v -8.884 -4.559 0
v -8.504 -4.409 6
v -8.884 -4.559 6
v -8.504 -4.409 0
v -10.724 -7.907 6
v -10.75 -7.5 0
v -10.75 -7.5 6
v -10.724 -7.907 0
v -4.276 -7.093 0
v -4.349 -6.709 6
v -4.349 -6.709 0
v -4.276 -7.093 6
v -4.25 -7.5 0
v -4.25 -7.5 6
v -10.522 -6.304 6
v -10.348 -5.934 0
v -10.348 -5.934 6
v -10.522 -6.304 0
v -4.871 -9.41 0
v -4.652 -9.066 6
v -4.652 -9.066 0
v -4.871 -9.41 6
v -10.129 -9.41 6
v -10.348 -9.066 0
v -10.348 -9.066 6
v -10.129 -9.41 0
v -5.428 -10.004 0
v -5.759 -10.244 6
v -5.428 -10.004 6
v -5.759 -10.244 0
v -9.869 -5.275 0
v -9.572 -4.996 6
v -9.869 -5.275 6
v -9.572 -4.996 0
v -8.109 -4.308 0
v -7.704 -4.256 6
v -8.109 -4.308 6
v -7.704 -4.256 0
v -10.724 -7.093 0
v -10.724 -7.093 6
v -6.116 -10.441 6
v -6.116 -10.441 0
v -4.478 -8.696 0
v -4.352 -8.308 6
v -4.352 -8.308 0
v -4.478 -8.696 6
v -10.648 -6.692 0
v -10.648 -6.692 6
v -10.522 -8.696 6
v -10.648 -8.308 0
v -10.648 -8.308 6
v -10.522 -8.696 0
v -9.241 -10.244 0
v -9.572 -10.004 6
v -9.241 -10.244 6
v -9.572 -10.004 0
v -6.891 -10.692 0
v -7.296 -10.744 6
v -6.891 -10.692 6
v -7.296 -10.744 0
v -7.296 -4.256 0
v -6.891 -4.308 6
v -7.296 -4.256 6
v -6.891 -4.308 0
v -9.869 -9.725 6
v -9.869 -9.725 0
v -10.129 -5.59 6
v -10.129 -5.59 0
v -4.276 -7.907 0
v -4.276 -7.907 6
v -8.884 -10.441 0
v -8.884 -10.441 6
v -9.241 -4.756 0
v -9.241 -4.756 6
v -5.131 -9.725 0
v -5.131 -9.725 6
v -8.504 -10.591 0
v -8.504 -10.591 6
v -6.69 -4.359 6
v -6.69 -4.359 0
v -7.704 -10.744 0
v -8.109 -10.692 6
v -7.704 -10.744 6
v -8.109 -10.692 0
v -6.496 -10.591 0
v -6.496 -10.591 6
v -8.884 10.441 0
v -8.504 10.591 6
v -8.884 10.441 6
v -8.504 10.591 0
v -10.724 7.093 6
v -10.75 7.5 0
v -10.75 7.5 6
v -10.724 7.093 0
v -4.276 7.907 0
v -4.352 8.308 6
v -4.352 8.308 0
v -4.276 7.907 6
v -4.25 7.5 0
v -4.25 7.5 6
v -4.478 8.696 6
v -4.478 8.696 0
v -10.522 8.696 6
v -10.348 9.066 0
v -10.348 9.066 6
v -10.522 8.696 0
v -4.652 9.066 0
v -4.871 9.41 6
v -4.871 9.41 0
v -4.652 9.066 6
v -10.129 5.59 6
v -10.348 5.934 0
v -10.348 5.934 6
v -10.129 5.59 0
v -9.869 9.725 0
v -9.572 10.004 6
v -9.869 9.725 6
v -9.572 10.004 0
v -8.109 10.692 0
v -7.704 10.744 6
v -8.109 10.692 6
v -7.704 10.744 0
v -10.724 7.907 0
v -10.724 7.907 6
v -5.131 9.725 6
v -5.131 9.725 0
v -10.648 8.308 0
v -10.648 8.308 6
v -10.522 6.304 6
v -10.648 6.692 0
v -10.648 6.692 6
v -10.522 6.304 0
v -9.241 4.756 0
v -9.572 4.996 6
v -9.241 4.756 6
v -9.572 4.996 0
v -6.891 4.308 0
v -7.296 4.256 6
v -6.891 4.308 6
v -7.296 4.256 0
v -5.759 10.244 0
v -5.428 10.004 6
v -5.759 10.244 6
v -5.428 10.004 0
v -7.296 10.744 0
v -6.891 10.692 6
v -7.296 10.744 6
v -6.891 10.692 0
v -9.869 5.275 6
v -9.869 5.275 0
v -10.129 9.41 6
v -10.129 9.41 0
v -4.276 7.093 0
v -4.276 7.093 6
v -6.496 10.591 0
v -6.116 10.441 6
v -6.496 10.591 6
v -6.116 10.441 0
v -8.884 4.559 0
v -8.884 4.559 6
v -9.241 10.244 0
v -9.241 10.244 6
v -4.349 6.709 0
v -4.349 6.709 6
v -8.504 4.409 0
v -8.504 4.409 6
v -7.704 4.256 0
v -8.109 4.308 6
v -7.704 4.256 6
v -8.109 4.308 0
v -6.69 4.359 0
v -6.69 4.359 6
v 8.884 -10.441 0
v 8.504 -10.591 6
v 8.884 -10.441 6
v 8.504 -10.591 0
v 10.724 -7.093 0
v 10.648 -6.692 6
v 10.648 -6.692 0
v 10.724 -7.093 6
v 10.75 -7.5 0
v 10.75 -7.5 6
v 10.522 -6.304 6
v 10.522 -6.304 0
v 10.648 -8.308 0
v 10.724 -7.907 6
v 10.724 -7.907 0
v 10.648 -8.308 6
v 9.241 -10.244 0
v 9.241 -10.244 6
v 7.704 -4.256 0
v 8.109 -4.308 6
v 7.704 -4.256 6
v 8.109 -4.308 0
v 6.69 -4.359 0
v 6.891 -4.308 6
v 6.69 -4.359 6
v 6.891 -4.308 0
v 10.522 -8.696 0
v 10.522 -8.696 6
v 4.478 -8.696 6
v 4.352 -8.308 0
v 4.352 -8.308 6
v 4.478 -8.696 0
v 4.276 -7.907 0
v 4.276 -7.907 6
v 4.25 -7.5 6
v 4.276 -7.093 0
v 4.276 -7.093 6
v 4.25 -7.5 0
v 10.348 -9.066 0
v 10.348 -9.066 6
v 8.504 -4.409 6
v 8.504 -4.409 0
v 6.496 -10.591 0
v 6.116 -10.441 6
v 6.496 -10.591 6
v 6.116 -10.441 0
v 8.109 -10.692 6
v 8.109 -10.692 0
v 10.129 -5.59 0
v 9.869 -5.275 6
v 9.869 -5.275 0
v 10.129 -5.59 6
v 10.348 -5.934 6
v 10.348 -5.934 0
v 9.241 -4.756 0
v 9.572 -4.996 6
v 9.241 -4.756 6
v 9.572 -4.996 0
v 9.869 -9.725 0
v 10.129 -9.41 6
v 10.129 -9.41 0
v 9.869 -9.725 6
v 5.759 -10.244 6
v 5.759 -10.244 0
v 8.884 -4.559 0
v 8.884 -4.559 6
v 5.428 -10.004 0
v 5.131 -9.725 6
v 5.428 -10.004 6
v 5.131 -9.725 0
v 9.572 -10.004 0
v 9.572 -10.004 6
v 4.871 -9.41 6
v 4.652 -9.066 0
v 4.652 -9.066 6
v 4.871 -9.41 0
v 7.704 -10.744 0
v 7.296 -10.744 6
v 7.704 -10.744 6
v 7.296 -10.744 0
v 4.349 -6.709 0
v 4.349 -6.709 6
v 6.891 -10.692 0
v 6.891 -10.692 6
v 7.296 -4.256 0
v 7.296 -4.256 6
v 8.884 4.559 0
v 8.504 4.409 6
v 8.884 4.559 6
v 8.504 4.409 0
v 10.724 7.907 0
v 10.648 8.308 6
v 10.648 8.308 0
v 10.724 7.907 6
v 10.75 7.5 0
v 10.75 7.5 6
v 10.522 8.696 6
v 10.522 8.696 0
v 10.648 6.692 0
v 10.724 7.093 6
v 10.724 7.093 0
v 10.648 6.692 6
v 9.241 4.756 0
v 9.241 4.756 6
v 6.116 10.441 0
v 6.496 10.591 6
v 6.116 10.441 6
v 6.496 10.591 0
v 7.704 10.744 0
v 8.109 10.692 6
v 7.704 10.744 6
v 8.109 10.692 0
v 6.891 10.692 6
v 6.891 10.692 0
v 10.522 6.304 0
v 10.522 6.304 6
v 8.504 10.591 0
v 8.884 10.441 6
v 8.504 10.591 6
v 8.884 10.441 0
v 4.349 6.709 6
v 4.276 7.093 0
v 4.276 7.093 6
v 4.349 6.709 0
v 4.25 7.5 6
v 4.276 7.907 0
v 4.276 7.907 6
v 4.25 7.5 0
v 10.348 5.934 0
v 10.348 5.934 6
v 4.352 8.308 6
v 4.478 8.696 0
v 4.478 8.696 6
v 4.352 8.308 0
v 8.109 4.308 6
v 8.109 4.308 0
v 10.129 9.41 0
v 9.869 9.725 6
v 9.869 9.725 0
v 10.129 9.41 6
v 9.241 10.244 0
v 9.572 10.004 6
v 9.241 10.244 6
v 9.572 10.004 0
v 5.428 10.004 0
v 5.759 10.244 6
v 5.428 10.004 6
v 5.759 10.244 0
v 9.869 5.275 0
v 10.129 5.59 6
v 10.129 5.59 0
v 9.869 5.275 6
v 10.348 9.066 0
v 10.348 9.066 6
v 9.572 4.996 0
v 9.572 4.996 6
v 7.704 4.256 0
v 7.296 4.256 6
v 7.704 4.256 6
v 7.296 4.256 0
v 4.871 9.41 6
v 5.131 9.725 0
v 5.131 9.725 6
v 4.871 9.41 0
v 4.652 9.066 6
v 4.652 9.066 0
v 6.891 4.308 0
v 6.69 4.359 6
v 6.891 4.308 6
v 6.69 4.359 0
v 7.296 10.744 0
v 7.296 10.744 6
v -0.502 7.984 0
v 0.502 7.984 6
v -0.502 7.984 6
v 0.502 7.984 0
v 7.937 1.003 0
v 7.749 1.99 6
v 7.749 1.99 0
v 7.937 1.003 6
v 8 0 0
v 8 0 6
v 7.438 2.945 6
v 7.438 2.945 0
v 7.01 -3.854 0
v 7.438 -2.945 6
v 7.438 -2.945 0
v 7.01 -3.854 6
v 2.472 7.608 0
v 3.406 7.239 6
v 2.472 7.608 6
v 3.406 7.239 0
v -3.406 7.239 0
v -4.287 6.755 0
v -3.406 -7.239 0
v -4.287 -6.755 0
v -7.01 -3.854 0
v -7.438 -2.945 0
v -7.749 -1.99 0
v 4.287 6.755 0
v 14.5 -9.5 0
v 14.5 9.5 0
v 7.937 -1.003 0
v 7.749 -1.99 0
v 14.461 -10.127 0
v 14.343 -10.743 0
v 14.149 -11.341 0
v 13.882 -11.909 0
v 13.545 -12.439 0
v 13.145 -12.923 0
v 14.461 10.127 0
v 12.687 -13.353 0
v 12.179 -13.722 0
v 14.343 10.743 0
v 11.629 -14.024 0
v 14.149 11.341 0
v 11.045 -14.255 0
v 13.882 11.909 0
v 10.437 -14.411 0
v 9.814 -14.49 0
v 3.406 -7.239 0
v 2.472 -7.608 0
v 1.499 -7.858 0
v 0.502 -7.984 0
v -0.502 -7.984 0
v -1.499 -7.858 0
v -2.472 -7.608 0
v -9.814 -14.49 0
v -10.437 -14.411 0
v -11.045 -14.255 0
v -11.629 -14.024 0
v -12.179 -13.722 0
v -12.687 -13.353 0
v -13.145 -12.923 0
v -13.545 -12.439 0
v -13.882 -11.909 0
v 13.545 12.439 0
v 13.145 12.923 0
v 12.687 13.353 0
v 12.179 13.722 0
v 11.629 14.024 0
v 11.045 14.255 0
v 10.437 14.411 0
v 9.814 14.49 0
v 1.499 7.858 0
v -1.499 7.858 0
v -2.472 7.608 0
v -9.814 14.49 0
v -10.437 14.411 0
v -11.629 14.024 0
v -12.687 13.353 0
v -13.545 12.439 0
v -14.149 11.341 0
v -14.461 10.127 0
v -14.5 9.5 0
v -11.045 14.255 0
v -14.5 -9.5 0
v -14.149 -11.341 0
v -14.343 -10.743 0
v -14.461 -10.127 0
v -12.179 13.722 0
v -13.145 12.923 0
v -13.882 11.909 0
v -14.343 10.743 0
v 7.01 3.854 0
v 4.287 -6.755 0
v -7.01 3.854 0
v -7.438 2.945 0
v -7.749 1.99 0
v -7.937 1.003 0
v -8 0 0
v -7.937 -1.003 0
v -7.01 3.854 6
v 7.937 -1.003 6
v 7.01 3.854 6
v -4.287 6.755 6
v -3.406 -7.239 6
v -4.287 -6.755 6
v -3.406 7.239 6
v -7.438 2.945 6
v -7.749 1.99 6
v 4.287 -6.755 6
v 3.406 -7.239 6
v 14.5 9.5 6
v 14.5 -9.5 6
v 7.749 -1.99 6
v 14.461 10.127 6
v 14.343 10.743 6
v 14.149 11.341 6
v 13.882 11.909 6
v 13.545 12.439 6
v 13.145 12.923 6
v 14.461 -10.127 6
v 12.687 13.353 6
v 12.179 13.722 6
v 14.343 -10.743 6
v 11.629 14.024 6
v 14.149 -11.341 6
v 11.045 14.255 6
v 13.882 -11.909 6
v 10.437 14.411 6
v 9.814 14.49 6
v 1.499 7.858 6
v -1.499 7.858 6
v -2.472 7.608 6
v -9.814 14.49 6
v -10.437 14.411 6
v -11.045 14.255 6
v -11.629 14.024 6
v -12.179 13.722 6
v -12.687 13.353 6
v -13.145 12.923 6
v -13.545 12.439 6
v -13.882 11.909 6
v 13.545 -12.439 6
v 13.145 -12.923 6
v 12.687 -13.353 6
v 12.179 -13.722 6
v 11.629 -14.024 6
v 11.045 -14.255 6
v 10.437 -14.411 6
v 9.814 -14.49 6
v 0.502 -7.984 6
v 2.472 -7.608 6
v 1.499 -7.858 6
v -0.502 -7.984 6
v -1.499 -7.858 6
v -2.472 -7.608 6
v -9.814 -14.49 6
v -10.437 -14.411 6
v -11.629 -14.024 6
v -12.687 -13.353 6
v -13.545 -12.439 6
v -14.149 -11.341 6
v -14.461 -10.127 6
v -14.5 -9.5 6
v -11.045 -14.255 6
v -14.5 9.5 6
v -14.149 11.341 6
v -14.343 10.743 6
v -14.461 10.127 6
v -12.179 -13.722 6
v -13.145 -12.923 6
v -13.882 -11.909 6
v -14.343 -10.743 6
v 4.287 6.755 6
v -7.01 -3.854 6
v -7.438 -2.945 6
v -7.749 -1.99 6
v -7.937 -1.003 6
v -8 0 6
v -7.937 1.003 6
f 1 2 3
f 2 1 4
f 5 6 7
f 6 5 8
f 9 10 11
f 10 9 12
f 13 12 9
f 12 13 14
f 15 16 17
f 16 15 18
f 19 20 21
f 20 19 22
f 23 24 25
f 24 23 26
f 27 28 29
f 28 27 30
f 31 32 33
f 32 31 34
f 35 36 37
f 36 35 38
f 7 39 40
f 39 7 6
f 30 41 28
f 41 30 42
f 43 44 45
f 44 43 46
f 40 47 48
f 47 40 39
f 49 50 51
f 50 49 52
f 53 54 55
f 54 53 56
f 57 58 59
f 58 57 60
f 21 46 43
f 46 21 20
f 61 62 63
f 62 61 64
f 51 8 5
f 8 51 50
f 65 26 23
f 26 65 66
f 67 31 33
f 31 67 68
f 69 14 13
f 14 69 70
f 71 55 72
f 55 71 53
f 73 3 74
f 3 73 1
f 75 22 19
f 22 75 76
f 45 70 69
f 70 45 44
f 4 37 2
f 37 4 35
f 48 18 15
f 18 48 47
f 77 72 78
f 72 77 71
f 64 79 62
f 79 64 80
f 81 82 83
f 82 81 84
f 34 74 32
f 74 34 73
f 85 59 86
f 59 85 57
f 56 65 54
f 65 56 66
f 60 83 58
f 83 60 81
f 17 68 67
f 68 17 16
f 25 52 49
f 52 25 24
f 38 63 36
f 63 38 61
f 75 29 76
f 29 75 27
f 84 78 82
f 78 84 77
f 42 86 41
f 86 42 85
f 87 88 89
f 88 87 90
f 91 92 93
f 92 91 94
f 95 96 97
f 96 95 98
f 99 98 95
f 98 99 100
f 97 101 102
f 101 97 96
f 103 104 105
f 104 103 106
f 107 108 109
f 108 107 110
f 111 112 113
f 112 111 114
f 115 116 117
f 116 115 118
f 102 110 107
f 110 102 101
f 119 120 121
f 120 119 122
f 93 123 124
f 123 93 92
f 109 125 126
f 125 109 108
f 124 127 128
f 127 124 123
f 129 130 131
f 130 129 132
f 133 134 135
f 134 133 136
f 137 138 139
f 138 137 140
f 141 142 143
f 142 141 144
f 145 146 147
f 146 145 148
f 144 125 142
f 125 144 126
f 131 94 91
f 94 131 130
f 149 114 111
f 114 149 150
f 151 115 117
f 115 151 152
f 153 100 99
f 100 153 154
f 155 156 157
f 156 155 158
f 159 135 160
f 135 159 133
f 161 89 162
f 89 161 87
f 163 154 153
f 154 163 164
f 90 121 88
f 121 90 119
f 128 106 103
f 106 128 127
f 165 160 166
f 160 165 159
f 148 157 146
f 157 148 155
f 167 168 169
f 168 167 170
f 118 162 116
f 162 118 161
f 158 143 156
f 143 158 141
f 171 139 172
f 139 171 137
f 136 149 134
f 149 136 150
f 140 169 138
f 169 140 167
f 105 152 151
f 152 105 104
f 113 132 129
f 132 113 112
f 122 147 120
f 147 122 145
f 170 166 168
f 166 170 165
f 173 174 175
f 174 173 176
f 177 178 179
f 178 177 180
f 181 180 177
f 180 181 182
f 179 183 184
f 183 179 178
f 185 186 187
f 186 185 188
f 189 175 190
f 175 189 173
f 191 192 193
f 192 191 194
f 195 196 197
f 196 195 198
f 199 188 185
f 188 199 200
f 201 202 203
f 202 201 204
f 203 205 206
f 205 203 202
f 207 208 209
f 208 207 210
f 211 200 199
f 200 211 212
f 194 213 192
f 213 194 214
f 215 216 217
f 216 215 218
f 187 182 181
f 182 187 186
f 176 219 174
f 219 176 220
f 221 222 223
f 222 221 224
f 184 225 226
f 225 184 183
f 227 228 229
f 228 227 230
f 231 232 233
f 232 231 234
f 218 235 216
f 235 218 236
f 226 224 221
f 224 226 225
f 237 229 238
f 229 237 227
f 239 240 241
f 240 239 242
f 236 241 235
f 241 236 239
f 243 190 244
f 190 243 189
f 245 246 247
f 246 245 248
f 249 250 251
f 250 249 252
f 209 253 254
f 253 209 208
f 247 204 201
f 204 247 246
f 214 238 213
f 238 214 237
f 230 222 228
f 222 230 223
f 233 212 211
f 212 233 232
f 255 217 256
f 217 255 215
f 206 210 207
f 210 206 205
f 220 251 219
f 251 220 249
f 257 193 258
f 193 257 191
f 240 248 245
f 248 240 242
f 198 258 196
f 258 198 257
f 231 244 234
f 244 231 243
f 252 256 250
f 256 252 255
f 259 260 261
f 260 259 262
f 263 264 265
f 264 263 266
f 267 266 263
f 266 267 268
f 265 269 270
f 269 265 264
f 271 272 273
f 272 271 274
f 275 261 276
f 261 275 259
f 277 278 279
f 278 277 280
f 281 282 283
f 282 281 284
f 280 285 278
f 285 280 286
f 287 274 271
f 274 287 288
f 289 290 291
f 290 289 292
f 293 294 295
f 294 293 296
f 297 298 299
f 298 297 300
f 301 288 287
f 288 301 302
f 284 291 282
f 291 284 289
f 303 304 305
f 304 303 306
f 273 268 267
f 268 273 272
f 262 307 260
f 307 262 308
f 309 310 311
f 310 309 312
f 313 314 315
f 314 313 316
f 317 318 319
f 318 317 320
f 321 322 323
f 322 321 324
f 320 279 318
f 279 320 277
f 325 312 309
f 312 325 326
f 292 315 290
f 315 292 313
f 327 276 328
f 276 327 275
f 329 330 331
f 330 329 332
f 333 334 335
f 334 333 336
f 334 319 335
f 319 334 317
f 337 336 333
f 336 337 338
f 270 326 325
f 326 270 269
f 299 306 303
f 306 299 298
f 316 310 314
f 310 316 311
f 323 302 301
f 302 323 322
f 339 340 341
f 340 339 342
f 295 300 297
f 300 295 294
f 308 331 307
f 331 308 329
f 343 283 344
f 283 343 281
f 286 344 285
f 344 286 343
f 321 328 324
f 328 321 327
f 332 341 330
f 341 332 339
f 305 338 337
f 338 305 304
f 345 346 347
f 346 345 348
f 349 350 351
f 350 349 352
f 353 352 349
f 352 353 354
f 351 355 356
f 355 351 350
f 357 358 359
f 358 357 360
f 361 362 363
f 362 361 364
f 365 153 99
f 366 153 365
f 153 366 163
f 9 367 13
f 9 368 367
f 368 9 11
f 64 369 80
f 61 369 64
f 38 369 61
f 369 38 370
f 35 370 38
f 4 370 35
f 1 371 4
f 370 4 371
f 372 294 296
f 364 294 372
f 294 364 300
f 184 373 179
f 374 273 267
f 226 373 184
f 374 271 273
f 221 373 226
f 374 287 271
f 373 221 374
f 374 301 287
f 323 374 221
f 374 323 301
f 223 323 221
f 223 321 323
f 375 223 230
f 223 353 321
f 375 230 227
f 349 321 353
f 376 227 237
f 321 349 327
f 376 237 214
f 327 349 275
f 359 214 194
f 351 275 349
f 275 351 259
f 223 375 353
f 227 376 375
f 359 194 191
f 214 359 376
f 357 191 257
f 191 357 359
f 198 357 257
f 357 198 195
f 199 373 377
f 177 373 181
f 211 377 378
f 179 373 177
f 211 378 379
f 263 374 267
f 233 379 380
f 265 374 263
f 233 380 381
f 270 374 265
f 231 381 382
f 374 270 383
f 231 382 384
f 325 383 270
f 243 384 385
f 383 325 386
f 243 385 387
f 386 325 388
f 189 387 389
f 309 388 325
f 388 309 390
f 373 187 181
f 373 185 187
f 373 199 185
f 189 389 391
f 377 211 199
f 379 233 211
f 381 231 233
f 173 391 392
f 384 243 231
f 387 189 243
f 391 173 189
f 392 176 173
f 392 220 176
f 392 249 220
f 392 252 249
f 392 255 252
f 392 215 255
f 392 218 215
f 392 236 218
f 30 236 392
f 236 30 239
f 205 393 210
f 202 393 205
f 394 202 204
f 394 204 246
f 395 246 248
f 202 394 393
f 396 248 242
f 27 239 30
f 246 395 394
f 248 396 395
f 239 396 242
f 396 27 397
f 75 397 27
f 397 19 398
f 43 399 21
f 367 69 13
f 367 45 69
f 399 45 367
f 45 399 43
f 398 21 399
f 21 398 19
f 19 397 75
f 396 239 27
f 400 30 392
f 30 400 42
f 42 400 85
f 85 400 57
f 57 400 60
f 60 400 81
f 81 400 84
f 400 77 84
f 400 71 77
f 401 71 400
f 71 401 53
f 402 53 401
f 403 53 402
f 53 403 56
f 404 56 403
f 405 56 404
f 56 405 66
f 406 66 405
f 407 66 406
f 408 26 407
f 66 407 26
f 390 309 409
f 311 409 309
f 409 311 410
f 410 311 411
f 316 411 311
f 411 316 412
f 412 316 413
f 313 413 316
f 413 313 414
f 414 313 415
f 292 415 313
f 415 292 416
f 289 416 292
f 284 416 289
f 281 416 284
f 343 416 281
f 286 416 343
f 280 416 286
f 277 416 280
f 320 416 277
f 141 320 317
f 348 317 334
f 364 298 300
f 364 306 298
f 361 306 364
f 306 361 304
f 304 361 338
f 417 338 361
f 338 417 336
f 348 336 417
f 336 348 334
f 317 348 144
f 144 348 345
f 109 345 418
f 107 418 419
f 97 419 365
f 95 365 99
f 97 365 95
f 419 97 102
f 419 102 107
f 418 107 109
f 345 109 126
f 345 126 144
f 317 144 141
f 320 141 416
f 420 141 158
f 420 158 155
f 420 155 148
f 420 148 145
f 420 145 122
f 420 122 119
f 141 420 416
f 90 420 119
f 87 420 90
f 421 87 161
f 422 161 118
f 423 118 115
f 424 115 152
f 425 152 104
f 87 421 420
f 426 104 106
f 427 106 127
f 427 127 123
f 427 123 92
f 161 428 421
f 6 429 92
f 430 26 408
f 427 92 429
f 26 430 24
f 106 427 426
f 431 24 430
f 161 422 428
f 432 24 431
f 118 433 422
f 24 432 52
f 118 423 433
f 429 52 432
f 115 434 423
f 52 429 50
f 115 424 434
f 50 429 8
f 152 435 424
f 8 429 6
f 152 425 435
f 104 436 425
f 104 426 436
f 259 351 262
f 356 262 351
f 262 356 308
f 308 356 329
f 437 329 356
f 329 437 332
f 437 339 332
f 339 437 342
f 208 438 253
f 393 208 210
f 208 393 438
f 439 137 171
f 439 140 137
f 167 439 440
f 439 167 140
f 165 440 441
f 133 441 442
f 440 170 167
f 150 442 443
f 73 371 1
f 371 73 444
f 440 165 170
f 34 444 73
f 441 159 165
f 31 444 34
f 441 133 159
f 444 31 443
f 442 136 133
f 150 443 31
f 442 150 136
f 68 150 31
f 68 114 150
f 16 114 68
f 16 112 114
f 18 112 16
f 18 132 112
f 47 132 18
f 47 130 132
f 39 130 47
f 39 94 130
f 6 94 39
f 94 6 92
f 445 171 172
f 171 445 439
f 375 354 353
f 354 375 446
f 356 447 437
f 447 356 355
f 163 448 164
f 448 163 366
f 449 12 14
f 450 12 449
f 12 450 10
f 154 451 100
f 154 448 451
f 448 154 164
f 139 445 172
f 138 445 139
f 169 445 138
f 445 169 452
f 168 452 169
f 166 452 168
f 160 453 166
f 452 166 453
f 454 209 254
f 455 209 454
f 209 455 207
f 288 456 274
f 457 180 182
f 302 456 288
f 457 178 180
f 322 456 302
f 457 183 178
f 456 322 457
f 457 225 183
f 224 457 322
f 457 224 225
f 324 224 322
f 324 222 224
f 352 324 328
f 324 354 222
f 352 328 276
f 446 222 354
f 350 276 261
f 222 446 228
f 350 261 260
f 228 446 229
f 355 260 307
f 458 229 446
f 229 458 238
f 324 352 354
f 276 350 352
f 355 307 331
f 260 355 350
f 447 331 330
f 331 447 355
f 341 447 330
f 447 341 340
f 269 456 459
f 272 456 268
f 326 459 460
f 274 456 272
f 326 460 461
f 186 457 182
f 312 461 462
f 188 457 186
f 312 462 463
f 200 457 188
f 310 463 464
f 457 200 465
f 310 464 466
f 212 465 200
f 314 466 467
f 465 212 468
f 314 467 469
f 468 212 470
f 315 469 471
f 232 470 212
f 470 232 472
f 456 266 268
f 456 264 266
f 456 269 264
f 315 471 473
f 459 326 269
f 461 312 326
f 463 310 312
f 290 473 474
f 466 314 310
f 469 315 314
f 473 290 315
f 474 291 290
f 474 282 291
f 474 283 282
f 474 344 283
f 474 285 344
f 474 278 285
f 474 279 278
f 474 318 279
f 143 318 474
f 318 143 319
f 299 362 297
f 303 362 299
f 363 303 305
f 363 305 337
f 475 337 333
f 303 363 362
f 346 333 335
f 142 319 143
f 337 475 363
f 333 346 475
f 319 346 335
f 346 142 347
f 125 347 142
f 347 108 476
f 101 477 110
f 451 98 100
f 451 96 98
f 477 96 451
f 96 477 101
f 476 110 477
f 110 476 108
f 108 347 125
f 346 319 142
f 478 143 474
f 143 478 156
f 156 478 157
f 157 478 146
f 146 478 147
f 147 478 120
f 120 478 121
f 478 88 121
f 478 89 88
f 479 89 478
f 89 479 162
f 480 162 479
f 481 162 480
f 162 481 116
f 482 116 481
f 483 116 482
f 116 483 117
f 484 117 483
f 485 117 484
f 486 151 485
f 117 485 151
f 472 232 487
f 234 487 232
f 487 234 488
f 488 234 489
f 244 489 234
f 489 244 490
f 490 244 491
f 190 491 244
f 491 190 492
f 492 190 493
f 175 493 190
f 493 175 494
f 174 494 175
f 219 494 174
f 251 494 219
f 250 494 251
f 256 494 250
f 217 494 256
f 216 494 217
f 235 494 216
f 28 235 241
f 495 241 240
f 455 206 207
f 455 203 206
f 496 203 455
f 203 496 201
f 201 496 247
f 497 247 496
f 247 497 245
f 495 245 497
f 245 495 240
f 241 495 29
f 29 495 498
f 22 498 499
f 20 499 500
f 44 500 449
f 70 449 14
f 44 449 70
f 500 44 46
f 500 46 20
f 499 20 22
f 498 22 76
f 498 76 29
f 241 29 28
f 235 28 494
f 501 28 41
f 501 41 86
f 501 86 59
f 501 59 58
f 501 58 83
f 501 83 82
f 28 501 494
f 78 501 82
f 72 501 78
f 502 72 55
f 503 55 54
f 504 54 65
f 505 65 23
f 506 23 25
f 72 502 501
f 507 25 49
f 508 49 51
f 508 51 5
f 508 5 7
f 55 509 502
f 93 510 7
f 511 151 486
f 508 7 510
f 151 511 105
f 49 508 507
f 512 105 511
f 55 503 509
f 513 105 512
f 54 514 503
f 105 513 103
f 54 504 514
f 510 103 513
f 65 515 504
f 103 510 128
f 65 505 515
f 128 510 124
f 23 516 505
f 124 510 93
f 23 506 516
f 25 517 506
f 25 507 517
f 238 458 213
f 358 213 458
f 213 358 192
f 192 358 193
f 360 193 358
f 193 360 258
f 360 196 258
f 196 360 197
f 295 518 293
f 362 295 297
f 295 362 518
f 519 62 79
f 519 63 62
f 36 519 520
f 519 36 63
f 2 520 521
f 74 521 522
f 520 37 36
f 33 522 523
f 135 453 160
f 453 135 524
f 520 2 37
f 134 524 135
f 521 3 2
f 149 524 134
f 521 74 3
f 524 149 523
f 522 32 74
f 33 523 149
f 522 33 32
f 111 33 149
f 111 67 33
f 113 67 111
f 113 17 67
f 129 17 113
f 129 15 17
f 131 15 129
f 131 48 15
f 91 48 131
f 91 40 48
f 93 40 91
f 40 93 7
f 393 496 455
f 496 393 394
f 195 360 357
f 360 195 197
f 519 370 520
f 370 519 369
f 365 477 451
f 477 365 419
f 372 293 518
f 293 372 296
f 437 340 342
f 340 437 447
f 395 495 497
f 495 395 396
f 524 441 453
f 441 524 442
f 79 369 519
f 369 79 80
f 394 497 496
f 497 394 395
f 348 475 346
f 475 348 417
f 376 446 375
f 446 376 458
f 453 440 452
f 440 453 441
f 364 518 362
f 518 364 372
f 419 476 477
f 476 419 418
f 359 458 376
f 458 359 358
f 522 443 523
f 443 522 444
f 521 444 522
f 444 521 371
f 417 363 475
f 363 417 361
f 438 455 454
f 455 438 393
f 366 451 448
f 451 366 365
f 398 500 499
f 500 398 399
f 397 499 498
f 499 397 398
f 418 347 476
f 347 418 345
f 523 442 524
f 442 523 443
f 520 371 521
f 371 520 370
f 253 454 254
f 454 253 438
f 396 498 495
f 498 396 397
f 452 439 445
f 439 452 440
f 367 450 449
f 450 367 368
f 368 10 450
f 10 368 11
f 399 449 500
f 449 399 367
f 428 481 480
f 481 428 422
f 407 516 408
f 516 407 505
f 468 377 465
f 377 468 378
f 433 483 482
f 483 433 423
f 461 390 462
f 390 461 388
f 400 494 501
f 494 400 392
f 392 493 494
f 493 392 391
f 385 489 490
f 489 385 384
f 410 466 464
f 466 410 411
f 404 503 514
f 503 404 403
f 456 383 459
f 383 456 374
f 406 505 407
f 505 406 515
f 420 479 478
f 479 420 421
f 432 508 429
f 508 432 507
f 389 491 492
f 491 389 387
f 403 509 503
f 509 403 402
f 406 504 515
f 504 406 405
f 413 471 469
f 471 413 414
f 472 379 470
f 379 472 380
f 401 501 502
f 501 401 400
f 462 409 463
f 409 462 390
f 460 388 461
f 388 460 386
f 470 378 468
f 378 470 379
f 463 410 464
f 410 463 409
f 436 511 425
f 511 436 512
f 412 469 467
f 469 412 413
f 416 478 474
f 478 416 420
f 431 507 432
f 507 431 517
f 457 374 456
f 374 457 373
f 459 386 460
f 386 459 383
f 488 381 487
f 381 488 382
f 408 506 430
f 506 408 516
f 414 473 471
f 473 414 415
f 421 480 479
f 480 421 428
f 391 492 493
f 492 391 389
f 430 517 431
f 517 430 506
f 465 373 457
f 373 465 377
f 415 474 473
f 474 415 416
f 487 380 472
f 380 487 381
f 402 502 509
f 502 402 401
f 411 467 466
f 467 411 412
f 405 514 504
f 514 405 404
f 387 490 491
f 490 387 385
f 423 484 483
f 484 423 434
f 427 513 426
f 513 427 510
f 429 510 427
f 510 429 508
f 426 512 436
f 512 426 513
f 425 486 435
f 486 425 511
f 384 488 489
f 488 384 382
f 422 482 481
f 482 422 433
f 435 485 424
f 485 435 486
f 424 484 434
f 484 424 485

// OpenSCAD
$fn = 50;

difference() {
	union() {
		hull() {
			translate(v = [-9.5, 9.5, 0]) {
				cylinder(h = 6, r = 5);
			}
			translate(v = [9.5, 9.5, 0]) {
				cylinder(h = 6, r = 5);
			}
			translate(v = [-9.5, -9.5, 0]) {
				cylinder(h = 6, r = 5);
			}
			translate(v = [9.5, -9.5, 0]) {
				cylinder(h = 6, r = 5);
			}
		}
	}
	union() {
		translate(v = [-7.5, -7.5, -100.0]) {
			cylinder(h = 200, r = 3.25);
		}
		translate(v = [-7.5, 7.5, -100.0]) {
			cylinder(h = 200, r = 3.25);
		}
		translate(v = [7.5, -7.5, -100.0]) {
			cylinder(h = 200, r = 3.25);
		}
		translate(v = [7.5, 7.5, -100.0]) {
			cylinder(h = 200, r = 3.25);
		}
		translate(v = [-7.5, -7.5, -100.0]) {
			cylinder(h = 200, r = 1.8);
		}
		translate(v = [-7.5, 7.5, -100.0]) {
			cylinder(h = 200, r = 1.8);
		}
		translate(v = [7.5, -7.5, -100.0]) {
			cylinder(h = 200, r = 1.8);
		}
		translate(v = [7.5, 7.5, -100.0]) {
			cylinder(h = 200, r = 1.8);
		}
		cylinder(h = 6, r = 8.0);
	}
}
